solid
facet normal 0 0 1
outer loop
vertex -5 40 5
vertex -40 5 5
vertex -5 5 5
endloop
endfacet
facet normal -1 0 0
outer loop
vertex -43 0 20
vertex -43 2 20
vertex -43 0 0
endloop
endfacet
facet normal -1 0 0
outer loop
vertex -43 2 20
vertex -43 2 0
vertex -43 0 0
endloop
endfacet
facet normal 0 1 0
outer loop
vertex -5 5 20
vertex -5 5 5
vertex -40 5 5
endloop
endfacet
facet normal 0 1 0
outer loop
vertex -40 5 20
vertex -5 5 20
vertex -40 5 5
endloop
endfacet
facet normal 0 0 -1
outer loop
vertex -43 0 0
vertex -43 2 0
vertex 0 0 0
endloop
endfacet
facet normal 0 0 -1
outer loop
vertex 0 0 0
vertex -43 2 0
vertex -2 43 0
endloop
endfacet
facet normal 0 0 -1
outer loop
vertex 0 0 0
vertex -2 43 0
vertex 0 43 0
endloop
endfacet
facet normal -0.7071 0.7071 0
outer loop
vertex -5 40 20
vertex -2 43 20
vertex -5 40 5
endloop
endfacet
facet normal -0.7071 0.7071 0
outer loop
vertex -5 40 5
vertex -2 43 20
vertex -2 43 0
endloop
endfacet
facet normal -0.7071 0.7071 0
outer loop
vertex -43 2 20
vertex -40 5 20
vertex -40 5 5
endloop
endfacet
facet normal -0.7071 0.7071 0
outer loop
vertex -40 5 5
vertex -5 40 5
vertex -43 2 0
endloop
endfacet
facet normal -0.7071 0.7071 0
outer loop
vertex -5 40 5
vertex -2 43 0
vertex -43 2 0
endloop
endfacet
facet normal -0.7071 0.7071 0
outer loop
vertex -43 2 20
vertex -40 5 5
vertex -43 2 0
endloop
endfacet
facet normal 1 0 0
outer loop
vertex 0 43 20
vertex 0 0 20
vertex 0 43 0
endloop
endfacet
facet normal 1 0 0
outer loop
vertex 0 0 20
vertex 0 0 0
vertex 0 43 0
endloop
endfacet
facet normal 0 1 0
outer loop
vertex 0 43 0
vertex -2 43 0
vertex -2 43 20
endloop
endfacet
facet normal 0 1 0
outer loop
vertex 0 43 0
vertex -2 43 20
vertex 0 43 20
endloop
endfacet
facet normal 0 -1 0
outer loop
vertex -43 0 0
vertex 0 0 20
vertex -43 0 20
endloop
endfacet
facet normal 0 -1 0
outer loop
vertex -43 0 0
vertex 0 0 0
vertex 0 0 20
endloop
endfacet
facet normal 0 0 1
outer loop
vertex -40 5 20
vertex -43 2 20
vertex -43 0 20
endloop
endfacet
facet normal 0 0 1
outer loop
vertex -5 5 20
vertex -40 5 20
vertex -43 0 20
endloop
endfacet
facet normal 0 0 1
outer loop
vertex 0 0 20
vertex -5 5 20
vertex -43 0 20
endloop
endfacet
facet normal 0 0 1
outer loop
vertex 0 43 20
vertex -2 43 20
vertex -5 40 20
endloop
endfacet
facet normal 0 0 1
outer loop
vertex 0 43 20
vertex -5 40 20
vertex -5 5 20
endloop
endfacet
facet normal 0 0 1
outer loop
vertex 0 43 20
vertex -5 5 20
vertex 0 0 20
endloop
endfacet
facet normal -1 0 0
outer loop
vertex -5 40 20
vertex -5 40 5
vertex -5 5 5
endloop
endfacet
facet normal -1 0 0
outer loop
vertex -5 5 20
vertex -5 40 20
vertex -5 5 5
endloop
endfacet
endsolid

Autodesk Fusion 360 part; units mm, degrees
sketch "Sketch1" plane through (0, 0, 0) normal (0, 0, 1) x (1, 0, 0)
  line L0 (0, 0) -> (-45, 0)
  line L1 (0, 0) -> (0, 45)
  line L2 (0, 45) -> (-45, 0)
  line L3 (-5, 40) -> (-5, 5)
  line L4 (-5, 5) -> (-40, 5)
  line L5 (-2, 43) -> (0, 43)
  line L6 (-43, 2) -> (-43, 0)
  dimension "d1" = 45
  dimension "d2" = 45
  dimension "d5" = 5
  dimension "d6" = 5
  dimension "d7" = 2
  dimension "d8" = 2
extrude "Extrude2" add sketch "Sketch1" along normal blind 20 contours L0 L1 L2 L3 L4 L5 L6
extrude "Extrude3" add sketch "Sketch1" along normal blind 5 contours L2 L3 L4
